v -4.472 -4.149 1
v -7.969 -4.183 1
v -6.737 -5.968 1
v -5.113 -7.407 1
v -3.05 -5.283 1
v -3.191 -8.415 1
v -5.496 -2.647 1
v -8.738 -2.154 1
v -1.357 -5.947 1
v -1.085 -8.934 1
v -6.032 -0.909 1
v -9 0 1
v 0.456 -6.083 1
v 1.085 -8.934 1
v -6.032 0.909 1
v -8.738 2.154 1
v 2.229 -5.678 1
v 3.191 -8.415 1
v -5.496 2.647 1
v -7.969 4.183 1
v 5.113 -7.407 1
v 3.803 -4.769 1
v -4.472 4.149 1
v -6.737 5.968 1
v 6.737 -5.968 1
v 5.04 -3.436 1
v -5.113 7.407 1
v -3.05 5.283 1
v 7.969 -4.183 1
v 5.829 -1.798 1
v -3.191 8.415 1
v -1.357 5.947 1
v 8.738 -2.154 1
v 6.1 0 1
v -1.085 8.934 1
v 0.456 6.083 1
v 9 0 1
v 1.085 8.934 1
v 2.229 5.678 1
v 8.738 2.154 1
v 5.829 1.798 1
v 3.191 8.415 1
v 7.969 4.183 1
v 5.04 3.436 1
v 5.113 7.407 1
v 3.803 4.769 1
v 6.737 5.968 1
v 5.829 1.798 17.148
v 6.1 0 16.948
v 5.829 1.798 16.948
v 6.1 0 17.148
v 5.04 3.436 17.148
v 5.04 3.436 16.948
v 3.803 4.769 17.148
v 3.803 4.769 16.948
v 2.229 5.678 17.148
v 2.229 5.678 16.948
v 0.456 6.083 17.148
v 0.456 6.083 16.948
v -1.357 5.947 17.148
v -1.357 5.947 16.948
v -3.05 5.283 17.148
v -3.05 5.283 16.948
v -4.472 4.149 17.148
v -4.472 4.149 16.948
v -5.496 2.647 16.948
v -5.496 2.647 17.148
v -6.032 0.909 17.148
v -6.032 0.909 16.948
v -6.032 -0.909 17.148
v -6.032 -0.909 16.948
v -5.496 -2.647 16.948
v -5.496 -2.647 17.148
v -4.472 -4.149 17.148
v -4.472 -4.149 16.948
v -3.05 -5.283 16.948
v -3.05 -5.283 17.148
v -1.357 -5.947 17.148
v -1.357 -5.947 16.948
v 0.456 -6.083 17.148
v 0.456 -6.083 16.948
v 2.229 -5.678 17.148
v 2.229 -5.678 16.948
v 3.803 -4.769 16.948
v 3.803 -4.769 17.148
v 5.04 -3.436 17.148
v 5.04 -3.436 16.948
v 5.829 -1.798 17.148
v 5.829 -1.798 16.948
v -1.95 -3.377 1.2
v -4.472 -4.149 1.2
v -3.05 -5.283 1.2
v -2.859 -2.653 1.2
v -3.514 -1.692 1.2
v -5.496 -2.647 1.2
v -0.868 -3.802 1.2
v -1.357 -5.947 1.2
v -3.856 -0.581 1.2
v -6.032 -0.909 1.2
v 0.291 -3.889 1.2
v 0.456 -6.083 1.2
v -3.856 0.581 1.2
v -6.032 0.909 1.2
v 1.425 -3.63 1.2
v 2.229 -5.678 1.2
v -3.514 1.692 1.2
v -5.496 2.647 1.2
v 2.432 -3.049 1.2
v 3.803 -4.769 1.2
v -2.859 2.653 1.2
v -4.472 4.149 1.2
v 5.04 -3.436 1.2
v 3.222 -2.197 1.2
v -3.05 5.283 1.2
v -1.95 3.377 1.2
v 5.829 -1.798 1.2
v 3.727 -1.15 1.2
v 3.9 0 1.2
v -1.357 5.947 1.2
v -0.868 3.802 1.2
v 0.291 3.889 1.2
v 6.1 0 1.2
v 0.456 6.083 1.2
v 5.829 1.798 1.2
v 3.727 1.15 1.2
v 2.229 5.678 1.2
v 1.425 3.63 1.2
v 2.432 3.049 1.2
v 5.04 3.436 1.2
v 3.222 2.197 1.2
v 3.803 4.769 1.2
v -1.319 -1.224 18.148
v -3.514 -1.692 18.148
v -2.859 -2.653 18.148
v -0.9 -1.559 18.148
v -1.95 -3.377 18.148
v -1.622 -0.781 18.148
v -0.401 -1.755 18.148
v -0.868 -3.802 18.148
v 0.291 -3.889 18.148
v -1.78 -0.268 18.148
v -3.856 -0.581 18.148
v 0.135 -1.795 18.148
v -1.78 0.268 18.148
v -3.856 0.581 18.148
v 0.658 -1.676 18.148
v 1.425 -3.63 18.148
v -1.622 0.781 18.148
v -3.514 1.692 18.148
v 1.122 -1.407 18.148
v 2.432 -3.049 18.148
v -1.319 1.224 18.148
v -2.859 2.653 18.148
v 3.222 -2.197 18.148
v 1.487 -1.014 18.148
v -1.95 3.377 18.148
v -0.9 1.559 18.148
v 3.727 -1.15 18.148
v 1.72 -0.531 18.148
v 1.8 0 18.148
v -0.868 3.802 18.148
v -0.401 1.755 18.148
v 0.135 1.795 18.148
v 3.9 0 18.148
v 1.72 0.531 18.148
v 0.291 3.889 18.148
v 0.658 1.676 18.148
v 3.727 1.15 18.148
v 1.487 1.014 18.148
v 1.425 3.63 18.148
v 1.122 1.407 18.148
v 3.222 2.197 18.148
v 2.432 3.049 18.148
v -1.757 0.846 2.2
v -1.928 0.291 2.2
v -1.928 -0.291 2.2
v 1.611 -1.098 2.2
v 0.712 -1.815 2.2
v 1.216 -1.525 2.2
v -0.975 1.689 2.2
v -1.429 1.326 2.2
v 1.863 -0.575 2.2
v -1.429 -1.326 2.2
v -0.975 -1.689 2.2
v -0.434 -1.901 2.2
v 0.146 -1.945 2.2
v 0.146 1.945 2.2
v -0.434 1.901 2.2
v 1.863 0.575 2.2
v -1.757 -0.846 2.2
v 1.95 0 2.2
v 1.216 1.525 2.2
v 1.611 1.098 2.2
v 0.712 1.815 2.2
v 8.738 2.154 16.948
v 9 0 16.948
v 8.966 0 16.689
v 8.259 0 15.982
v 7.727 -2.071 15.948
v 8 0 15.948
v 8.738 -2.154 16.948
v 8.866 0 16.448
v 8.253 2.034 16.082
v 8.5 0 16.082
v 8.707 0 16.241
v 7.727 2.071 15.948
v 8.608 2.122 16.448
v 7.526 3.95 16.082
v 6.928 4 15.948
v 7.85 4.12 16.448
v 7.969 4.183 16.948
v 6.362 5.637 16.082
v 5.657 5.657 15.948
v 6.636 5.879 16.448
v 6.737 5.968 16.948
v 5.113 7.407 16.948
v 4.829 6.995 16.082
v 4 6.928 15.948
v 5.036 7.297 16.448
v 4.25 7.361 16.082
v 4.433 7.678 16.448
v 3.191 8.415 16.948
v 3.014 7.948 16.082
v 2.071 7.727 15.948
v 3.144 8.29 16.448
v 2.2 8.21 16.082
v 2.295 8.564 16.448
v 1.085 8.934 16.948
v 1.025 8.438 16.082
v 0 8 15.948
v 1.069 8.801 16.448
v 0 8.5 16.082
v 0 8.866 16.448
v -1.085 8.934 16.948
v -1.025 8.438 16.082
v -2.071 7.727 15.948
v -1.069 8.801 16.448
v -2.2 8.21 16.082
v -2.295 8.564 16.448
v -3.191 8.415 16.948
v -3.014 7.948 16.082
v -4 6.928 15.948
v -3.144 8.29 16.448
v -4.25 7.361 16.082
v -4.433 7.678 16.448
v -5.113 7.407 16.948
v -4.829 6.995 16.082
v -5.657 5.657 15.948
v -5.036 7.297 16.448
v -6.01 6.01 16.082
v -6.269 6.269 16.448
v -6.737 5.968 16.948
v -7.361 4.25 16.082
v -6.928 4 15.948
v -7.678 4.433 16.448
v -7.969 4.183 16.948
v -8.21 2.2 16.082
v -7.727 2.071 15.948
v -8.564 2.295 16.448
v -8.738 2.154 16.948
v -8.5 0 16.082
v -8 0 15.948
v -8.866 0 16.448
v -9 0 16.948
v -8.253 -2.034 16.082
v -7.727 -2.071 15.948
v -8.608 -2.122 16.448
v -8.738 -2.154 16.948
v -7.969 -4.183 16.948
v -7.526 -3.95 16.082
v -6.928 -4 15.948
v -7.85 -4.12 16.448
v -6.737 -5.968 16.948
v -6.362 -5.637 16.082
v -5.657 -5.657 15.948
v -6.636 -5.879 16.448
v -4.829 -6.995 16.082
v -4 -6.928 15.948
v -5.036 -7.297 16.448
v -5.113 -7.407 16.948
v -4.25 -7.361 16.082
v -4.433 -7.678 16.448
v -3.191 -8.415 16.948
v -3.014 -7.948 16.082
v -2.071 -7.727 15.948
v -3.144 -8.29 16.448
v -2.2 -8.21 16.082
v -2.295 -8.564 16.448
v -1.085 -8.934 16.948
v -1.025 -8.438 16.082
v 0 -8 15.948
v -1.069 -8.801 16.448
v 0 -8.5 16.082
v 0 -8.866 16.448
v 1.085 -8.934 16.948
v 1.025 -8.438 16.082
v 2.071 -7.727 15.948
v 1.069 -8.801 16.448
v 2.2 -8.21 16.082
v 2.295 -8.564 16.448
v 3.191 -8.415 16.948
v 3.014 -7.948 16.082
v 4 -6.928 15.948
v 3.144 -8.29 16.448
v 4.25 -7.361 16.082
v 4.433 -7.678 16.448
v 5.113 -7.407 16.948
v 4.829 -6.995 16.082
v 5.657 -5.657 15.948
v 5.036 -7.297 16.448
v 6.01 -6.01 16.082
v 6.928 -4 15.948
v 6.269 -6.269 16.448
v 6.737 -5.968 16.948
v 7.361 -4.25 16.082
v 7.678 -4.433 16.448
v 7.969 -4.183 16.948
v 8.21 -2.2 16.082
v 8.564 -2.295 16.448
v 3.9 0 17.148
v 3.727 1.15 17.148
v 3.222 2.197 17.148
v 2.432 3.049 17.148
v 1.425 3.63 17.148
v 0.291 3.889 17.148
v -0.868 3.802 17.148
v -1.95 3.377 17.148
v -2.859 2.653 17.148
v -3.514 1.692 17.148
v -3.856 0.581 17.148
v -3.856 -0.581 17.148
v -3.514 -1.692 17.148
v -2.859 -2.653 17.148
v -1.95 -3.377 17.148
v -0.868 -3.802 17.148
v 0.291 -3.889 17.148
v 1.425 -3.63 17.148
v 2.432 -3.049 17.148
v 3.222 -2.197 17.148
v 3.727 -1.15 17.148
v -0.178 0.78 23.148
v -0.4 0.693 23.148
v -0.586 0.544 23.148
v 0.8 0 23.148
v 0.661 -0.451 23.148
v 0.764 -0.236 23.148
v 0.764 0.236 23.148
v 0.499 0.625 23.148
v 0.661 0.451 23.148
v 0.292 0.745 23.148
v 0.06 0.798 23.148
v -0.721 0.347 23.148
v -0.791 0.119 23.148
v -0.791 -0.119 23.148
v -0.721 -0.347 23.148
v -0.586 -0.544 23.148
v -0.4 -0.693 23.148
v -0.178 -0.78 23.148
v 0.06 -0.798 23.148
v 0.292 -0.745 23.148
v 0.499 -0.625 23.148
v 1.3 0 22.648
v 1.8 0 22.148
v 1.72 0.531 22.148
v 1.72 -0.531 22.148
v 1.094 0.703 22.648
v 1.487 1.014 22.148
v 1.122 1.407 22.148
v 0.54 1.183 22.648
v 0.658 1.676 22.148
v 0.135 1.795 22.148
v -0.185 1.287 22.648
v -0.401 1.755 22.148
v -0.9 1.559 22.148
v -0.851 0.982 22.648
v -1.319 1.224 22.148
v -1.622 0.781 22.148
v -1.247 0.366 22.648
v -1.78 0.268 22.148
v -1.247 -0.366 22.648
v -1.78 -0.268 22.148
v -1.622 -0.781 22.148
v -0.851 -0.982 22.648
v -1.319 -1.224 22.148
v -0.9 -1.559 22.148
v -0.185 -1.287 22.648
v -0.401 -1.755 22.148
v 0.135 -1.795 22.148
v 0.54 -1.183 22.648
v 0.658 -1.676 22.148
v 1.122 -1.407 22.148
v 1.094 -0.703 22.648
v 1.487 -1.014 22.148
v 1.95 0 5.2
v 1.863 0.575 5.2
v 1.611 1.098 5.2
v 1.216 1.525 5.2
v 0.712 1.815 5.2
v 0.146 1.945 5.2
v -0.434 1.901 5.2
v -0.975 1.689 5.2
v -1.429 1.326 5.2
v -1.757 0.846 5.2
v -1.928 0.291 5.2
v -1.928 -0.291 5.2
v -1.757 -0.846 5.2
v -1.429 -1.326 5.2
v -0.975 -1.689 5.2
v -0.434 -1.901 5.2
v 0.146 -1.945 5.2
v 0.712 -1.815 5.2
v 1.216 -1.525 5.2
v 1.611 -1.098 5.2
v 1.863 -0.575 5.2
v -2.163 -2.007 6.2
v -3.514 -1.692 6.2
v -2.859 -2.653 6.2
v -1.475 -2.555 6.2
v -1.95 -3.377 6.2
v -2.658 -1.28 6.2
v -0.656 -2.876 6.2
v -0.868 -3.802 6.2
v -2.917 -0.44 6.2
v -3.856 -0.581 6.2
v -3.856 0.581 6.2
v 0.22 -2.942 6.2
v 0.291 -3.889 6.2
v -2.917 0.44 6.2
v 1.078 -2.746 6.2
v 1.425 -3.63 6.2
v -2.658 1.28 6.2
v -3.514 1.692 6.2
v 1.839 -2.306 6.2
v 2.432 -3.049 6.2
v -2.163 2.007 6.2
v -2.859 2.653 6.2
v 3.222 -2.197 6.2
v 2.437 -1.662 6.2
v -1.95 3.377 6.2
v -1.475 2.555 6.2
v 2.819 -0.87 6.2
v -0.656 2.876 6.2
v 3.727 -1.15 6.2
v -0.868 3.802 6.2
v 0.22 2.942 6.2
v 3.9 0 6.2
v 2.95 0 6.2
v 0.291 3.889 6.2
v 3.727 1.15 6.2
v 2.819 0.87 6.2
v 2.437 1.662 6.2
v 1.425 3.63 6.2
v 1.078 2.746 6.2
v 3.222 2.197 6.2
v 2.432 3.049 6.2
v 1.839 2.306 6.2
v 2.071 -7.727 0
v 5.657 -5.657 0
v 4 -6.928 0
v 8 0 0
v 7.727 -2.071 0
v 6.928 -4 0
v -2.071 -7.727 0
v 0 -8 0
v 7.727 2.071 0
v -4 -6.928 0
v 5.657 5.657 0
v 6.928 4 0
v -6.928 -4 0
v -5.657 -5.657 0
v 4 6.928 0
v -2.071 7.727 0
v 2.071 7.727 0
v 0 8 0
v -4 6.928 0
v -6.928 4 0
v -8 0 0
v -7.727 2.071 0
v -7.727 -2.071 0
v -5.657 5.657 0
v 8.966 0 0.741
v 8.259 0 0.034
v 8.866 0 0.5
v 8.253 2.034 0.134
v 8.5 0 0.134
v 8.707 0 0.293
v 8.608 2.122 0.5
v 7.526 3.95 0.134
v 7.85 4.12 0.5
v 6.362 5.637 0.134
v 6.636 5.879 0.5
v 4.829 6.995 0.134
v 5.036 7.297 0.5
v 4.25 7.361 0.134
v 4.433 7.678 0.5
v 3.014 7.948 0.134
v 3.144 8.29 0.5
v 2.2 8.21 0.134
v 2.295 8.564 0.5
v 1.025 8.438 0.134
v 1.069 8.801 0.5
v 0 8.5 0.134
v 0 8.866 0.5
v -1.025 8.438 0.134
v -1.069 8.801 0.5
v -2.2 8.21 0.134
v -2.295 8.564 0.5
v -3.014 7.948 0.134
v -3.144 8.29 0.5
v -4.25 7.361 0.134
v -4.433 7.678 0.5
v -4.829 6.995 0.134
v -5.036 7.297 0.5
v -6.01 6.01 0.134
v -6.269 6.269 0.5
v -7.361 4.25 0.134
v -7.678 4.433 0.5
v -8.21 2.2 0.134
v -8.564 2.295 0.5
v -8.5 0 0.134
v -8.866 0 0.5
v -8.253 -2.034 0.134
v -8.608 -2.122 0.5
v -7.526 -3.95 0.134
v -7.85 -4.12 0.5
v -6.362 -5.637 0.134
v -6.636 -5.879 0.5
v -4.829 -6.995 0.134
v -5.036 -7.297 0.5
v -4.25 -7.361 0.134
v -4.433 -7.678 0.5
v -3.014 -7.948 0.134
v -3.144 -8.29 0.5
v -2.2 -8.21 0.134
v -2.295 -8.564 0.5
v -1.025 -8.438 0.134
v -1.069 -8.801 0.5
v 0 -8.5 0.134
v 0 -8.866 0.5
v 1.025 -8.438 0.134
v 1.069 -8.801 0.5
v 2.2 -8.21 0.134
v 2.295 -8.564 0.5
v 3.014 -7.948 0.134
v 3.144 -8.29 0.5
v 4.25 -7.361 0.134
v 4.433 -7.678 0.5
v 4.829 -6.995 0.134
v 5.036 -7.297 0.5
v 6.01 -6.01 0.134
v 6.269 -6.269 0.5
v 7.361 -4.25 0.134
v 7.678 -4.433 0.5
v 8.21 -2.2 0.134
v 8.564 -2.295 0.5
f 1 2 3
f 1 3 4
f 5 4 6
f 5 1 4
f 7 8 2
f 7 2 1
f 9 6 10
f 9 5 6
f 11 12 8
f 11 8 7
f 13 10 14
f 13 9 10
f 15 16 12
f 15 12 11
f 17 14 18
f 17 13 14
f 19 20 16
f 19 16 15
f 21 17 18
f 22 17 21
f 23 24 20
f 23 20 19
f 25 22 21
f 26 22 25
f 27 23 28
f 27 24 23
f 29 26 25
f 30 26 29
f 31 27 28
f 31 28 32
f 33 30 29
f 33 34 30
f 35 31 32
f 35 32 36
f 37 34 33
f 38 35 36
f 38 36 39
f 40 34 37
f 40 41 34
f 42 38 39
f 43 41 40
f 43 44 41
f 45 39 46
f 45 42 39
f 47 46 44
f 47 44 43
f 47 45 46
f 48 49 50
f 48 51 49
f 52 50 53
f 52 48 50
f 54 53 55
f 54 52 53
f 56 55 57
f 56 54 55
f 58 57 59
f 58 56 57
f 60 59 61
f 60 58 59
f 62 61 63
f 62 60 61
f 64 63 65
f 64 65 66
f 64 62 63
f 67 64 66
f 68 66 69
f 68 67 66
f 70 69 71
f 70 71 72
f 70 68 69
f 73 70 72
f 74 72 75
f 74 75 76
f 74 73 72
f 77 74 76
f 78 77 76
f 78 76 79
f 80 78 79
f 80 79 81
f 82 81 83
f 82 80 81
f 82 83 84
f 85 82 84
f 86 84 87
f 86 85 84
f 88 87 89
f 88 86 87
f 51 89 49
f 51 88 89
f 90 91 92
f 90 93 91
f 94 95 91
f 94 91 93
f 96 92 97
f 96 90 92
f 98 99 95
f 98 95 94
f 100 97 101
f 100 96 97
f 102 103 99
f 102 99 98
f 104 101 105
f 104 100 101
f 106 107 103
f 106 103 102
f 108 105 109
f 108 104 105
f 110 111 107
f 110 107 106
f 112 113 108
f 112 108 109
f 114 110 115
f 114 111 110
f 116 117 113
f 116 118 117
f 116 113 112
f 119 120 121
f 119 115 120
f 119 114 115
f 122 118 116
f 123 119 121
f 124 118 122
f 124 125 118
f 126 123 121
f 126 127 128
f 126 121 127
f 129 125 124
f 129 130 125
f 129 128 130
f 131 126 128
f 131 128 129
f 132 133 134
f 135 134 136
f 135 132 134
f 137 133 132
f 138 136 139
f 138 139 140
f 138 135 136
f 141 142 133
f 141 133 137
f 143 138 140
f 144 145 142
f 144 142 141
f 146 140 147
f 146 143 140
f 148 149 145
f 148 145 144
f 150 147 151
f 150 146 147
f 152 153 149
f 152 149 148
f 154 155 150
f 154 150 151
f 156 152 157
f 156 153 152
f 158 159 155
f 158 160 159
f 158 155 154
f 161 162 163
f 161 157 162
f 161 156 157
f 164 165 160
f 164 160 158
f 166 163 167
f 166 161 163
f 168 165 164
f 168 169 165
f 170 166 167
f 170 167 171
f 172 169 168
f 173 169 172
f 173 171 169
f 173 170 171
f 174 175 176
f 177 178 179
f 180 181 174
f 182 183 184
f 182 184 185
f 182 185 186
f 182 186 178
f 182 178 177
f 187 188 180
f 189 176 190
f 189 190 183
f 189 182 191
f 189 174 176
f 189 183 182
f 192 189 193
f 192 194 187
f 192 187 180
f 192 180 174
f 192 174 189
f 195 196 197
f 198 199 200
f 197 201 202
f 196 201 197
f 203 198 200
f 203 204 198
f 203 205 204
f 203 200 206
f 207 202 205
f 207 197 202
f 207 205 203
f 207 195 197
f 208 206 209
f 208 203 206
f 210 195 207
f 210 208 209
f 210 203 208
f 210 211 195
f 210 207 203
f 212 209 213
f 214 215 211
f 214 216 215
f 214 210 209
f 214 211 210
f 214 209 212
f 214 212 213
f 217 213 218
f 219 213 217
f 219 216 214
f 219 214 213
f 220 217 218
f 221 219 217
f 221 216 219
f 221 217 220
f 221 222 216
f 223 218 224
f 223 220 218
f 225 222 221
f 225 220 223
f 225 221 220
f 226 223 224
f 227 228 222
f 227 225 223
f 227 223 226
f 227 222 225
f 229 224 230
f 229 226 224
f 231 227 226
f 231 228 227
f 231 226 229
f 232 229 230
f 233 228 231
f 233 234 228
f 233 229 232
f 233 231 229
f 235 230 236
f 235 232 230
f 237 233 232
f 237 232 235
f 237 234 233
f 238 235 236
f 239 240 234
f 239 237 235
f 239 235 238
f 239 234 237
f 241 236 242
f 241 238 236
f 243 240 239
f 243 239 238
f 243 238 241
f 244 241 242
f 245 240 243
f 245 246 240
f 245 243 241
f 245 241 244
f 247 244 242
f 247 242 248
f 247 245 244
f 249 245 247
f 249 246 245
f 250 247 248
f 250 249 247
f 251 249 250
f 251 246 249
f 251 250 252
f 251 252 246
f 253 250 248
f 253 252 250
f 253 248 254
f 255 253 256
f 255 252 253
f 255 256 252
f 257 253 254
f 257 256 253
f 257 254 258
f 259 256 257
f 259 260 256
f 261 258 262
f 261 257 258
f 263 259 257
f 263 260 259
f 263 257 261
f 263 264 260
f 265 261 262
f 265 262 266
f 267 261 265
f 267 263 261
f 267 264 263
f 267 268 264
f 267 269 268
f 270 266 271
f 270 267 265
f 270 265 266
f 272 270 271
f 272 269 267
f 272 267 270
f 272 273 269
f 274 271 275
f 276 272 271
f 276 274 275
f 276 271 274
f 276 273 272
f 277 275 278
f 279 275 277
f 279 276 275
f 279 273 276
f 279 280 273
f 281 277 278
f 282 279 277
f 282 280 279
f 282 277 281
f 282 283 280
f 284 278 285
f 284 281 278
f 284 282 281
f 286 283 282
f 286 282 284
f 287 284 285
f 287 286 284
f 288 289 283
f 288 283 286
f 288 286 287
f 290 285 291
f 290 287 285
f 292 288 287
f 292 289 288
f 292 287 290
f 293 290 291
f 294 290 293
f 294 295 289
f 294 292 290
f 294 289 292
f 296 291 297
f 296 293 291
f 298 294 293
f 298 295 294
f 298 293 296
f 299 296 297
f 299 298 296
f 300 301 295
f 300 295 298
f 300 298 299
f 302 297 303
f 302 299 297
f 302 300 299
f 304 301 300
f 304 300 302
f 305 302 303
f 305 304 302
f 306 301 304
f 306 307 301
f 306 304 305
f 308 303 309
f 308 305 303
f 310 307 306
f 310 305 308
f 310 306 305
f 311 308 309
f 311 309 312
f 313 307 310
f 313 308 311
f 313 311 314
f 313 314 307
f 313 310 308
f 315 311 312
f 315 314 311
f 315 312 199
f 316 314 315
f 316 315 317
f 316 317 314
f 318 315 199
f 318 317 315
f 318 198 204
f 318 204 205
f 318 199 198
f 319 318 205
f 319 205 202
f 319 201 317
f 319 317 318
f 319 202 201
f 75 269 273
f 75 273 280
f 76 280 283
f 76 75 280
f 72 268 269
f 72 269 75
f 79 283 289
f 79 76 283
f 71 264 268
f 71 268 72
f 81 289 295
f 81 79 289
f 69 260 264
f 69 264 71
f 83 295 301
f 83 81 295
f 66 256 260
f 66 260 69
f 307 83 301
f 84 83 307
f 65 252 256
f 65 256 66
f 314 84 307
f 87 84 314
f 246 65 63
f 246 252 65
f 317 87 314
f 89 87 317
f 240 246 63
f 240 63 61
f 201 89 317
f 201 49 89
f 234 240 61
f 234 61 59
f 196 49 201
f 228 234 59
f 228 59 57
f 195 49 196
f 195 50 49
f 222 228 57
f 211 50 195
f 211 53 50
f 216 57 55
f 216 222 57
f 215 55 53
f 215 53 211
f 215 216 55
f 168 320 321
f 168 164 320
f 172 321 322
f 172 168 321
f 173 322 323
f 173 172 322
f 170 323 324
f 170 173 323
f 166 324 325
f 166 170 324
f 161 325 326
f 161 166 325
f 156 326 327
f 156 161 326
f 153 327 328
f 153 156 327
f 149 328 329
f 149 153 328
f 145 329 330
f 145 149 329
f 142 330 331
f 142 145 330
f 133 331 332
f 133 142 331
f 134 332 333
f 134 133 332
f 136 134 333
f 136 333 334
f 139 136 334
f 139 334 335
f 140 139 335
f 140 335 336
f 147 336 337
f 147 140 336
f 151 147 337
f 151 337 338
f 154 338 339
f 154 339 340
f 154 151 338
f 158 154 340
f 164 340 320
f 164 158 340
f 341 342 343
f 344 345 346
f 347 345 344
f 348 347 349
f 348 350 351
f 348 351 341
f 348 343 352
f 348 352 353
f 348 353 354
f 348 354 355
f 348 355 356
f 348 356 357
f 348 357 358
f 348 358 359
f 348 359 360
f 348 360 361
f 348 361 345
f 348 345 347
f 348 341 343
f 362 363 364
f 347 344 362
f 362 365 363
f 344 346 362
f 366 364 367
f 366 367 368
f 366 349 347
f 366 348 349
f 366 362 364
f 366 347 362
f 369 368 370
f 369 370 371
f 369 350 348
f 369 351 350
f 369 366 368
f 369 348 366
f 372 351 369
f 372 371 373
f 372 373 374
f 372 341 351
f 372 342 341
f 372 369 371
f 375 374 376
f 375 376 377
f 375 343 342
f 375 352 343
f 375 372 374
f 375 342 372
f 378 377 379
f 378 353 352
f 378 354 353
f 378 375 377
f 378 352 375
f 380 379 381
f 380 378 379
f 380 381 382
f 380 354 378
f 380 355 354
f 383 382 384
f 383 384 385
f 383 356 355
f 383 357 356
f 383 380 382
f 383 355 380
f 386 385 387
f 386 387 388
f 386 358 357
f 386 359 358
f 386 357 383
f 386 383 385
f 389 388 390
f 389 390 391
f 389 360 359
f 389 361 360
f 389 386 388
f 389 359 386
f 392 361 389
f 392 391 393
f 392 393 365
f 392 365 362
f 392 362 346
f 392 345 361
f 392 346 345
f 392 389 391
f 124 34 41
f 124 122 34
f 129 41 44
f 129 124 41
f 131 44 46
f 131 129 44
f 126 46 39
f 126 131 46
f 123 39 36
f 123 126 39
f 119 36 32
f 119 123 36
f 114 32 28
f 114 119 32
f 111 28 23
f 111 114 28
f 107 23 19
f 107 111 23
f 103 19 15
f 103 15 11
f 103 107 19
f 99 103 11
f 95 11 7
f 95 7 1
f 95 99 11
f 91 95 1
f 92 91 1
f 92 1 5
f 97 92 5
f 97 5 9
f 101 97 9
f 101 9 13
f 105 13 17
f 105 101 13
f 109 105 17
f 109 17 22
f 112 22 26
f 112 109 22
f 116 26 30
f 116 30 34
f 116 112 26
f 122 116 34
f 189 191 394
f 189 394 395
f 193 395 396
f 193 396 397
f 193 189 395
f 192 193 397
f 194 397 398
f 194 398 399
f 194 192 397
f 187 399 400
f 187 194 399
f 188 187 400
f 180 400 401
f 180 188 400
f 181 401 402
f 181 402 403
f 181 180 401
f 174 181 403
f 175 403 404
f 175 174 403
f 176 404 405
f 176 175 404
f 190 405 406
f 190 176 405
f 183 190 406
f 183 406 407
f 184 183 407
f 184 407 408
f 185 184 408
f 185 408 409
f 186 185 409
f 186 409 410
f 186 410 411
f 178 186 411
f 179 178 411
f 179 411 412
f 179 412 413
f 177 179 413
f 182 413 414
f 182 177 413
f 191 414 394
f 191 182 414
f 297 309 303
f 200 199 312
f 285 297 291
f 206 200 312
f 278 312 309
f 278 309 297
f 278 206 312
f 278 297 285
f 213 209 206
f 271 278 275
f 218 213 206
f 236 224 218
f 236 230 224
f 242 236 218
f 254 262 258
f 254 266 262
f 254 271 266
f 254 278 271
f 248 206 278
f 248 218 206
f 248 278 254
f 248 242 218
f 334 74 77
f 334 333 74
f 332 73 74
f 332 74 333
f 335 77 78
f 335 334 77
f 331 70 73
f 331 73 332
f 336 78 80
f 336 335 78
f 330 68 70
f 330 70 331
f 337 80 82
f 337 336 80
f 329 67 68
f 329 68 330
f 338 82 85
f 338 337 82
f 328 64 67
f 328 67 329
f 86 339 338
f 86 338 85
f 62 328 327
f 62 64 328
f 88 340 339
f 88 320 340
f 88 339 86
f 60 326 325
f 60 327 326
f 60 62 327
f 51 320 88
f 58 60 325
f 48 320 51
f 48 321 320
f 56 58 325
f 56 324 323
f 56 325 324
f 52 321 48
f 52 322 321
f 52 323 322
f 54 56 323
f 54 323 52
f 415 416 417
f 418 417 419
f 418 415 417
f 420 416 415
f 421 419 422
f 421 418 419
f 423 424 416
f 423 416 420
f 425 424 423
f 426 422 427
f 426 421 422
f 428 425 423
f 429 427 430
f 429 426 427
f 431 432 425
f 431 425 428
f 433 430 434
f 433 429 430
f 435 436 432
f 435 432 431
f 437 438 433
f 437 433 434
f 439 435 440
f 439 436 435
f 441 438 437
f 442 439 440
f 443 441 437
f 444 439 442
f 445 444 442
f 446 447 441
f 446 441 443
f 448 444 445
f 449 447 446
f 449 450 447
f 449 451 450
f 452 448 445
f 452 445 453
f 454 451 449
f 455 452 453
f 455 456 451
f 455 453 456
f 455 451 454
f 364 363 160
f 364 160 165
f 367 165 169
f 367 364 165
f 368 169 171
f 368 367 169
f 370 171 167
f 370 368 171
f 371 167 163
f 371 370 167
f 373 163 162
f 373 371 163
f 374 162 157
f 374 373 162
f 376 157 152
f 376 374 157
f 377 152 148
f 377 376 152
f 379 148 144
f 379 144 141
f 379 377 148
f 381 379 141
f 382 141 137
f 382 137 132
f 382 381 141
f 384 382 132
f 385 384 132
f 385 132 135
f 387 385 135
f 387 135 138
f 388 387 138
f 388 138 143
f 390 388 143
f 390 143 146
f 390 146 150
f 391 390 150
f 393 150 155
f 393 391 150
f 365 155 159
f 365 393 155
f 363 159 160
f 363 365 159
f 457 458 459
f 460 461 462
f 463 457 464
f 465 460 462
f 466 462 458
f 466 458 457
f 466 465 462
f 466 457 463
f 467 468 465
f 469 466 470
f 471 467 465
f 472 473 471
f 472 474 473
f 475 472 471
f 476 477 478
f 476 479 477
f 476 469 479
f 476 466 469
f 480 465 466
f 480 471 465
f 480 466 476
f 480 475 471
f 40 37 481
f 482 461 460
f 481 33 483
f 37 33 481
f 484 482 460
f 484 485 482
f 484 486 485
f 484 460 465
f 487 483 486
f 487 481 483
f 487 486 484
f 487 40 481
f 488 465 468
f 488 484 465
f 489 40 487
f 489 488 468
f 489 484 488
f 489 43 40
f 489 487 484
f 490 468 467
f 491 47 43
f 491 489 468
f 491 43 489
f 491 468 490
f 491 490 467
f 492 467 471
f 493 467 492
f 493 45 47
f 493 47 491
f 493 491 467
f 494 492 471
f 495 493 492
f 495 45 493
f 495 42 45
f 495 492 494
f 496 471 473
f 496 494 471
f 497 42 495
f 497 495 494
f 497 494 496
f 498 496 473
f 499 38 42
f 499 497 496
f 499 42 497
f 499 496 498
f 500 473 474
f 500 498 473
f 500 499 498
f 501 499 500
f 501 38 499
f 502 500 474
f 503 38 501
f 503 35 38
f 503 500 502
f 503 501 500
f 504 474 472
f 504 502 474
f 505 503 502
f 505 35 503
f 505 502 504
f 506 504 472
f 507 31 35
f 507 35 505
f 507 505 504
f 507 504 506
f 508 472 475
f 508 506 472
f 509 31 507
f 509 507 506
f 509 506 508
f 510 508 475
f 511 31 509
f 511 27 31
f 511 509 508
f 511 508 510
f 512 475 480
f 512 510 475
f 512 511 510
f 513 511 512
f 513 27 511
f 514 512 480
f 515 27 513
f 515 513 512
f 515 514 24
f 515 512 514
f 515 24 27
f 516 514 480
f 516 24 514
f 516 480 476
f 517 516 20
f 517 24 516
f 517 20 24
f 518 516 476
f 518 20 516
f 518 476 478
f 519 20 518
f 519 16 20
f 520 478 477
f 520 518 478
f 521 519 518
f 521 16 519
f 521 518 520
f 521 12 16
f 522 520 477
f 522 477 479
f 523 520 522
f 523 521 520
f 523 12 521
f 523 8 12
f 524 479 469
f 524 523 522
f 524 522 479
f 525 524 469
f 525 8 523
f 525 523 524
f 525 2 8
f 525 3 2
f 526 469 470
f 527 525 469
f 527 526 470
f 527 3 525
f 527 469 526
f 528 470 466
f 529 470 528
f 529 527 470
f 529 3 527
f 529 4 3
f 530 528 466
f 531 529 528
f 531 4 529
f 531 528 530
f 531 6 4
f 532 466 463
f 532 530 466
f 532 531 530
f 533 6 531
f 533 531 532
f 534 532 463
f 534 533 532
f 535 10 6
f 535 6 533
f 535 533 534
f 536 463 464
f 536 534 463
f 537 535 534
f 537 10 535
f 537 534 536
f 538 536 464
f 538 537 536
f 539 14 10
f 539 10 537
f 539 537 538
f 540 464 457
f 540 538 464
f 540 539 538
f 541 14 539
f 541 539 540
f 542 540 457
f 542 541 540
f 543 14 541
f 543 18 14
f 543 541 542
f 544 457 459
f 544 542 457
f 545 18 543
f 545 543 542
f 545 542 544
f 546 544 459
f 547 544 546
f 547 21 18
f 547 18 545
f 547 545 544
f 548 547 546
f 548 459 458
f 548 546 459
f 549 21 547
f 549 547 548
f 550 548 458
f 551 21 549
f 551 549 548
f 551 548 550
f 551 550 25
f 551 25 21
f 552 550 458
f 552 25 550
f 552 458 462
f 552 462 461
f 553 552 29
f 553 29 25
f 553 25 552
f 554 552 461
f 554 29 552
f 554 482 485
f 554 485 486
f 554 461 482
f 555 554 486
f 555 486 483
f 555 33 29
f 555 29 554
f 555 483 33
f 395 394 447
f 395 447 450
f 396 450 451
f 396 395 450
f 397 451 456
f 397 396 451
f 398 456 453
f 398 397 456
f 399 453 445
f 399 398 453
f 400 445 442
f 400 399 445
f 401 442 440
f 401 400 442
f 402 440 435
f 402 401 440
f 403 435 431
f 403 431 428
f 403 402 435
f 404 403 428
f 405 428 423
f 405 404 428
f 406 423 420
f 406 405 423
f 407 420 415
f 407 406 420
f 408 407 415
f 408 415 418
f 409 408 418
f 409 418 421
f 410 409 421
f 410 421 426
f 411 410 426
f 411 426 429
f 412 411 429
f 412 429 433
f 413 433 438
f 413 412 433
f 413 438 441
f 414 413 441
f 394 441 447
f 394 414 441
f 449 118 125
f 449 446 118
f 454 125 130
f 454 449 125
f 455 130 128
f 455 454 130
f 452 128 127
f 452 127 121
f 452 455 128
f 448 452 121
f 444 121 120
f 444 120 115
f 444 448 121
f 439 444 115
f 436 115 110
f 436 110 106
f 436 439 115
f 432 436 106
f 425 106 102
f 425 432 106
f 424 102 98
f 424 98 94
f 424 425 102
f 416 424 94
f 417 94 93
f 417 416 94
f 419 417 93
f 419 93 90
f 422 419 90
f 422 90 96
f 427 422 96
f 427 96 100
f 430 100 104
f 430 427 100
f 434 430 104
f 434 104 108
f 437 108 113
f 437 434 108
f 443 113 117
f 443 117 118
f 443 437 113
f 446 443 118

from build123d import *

# Parameters (mm, degrees)
F2_R    = 0.99999
F3_SIZE = 1
F6_R    = 0.99999
F7_SIZE = 1


# Not quite as in the source:
# - a fillet or chamfer is up to 0.001 mm smaller than in the source, because OpenCascade refuses the exact size


with BuildPart() as f1:
    # F0 (on Front) → F1 (revolve)
    with BuildSketch(Plane.XZ):
        Polygon((0, 1), (0, 0), (9, 0), (9, 1), (6.1, 1), (6.1, 1.2), (3.9, 1.2), (3.9, 6.2), (1.95, 6.2), (1.95, 2.2), (0, 2.2), (0, 1.7075754004), align=None)
    revolve(axis=Axis((0, 0, 1.9537877002), (0, 0, 1)))

    # F2 (radius 1 in the source; OpenCascade refuses exactly that, so slightly less here)
    f2_edges = [f1.edges().sort_by_distance(p)[0] for p in [
        (-9, 0, 0),
    ]]
    fillet(f2_edges, radius=F2_R)

    # F3
    f3_edges = [f1.edges().sort_by_distance(p)[0] for p in [
        (-1.95, 0, 6.2),
    ]]
    chamfer(f3_edges, length=F3_SIZE)


with BuildPart() as f5:
    # F4 (on Front) → F5 (revolve)
    with BuildSketch(Plane.XZ):
        Polygon((0, 16.9479211028), (0, 15.9479211028), (9, 15.9479211028), (9, 16.9479211028), (6.1, 16.9479211028), (6.1, 17.1479211028), (3.9, 17.1479211028), (3.9, 18.1479211028), (1.8, 18.1479211028), (1.8, 23.1479211028), (0, 23.1479211028), (0, 18.1479211028), (0, 17.1479211028), align=None)
    revolve(axis=Axis((0, 0, 17.6479211028), (0, 0, 1)))

    # F6 (radius 1 in the source; OpenCascade refuses exactly that, so slightly less here)
    f6_edges = [f5.edges().sort_by_distance(p)[0] for p in [
        (-9, 0, 15.947921),
    ]]
    fillet(f6_edges, radius=F6_R)

    # F7
    f7_edges = [f5.edges().sort_by_distance(p)[0] for p in [
        (-1.8, 0, 23.147921),
    ]]
    chamfer(f7_edges, length=F7_SIZE)


solid = Compound([f1.part, f5.part])
